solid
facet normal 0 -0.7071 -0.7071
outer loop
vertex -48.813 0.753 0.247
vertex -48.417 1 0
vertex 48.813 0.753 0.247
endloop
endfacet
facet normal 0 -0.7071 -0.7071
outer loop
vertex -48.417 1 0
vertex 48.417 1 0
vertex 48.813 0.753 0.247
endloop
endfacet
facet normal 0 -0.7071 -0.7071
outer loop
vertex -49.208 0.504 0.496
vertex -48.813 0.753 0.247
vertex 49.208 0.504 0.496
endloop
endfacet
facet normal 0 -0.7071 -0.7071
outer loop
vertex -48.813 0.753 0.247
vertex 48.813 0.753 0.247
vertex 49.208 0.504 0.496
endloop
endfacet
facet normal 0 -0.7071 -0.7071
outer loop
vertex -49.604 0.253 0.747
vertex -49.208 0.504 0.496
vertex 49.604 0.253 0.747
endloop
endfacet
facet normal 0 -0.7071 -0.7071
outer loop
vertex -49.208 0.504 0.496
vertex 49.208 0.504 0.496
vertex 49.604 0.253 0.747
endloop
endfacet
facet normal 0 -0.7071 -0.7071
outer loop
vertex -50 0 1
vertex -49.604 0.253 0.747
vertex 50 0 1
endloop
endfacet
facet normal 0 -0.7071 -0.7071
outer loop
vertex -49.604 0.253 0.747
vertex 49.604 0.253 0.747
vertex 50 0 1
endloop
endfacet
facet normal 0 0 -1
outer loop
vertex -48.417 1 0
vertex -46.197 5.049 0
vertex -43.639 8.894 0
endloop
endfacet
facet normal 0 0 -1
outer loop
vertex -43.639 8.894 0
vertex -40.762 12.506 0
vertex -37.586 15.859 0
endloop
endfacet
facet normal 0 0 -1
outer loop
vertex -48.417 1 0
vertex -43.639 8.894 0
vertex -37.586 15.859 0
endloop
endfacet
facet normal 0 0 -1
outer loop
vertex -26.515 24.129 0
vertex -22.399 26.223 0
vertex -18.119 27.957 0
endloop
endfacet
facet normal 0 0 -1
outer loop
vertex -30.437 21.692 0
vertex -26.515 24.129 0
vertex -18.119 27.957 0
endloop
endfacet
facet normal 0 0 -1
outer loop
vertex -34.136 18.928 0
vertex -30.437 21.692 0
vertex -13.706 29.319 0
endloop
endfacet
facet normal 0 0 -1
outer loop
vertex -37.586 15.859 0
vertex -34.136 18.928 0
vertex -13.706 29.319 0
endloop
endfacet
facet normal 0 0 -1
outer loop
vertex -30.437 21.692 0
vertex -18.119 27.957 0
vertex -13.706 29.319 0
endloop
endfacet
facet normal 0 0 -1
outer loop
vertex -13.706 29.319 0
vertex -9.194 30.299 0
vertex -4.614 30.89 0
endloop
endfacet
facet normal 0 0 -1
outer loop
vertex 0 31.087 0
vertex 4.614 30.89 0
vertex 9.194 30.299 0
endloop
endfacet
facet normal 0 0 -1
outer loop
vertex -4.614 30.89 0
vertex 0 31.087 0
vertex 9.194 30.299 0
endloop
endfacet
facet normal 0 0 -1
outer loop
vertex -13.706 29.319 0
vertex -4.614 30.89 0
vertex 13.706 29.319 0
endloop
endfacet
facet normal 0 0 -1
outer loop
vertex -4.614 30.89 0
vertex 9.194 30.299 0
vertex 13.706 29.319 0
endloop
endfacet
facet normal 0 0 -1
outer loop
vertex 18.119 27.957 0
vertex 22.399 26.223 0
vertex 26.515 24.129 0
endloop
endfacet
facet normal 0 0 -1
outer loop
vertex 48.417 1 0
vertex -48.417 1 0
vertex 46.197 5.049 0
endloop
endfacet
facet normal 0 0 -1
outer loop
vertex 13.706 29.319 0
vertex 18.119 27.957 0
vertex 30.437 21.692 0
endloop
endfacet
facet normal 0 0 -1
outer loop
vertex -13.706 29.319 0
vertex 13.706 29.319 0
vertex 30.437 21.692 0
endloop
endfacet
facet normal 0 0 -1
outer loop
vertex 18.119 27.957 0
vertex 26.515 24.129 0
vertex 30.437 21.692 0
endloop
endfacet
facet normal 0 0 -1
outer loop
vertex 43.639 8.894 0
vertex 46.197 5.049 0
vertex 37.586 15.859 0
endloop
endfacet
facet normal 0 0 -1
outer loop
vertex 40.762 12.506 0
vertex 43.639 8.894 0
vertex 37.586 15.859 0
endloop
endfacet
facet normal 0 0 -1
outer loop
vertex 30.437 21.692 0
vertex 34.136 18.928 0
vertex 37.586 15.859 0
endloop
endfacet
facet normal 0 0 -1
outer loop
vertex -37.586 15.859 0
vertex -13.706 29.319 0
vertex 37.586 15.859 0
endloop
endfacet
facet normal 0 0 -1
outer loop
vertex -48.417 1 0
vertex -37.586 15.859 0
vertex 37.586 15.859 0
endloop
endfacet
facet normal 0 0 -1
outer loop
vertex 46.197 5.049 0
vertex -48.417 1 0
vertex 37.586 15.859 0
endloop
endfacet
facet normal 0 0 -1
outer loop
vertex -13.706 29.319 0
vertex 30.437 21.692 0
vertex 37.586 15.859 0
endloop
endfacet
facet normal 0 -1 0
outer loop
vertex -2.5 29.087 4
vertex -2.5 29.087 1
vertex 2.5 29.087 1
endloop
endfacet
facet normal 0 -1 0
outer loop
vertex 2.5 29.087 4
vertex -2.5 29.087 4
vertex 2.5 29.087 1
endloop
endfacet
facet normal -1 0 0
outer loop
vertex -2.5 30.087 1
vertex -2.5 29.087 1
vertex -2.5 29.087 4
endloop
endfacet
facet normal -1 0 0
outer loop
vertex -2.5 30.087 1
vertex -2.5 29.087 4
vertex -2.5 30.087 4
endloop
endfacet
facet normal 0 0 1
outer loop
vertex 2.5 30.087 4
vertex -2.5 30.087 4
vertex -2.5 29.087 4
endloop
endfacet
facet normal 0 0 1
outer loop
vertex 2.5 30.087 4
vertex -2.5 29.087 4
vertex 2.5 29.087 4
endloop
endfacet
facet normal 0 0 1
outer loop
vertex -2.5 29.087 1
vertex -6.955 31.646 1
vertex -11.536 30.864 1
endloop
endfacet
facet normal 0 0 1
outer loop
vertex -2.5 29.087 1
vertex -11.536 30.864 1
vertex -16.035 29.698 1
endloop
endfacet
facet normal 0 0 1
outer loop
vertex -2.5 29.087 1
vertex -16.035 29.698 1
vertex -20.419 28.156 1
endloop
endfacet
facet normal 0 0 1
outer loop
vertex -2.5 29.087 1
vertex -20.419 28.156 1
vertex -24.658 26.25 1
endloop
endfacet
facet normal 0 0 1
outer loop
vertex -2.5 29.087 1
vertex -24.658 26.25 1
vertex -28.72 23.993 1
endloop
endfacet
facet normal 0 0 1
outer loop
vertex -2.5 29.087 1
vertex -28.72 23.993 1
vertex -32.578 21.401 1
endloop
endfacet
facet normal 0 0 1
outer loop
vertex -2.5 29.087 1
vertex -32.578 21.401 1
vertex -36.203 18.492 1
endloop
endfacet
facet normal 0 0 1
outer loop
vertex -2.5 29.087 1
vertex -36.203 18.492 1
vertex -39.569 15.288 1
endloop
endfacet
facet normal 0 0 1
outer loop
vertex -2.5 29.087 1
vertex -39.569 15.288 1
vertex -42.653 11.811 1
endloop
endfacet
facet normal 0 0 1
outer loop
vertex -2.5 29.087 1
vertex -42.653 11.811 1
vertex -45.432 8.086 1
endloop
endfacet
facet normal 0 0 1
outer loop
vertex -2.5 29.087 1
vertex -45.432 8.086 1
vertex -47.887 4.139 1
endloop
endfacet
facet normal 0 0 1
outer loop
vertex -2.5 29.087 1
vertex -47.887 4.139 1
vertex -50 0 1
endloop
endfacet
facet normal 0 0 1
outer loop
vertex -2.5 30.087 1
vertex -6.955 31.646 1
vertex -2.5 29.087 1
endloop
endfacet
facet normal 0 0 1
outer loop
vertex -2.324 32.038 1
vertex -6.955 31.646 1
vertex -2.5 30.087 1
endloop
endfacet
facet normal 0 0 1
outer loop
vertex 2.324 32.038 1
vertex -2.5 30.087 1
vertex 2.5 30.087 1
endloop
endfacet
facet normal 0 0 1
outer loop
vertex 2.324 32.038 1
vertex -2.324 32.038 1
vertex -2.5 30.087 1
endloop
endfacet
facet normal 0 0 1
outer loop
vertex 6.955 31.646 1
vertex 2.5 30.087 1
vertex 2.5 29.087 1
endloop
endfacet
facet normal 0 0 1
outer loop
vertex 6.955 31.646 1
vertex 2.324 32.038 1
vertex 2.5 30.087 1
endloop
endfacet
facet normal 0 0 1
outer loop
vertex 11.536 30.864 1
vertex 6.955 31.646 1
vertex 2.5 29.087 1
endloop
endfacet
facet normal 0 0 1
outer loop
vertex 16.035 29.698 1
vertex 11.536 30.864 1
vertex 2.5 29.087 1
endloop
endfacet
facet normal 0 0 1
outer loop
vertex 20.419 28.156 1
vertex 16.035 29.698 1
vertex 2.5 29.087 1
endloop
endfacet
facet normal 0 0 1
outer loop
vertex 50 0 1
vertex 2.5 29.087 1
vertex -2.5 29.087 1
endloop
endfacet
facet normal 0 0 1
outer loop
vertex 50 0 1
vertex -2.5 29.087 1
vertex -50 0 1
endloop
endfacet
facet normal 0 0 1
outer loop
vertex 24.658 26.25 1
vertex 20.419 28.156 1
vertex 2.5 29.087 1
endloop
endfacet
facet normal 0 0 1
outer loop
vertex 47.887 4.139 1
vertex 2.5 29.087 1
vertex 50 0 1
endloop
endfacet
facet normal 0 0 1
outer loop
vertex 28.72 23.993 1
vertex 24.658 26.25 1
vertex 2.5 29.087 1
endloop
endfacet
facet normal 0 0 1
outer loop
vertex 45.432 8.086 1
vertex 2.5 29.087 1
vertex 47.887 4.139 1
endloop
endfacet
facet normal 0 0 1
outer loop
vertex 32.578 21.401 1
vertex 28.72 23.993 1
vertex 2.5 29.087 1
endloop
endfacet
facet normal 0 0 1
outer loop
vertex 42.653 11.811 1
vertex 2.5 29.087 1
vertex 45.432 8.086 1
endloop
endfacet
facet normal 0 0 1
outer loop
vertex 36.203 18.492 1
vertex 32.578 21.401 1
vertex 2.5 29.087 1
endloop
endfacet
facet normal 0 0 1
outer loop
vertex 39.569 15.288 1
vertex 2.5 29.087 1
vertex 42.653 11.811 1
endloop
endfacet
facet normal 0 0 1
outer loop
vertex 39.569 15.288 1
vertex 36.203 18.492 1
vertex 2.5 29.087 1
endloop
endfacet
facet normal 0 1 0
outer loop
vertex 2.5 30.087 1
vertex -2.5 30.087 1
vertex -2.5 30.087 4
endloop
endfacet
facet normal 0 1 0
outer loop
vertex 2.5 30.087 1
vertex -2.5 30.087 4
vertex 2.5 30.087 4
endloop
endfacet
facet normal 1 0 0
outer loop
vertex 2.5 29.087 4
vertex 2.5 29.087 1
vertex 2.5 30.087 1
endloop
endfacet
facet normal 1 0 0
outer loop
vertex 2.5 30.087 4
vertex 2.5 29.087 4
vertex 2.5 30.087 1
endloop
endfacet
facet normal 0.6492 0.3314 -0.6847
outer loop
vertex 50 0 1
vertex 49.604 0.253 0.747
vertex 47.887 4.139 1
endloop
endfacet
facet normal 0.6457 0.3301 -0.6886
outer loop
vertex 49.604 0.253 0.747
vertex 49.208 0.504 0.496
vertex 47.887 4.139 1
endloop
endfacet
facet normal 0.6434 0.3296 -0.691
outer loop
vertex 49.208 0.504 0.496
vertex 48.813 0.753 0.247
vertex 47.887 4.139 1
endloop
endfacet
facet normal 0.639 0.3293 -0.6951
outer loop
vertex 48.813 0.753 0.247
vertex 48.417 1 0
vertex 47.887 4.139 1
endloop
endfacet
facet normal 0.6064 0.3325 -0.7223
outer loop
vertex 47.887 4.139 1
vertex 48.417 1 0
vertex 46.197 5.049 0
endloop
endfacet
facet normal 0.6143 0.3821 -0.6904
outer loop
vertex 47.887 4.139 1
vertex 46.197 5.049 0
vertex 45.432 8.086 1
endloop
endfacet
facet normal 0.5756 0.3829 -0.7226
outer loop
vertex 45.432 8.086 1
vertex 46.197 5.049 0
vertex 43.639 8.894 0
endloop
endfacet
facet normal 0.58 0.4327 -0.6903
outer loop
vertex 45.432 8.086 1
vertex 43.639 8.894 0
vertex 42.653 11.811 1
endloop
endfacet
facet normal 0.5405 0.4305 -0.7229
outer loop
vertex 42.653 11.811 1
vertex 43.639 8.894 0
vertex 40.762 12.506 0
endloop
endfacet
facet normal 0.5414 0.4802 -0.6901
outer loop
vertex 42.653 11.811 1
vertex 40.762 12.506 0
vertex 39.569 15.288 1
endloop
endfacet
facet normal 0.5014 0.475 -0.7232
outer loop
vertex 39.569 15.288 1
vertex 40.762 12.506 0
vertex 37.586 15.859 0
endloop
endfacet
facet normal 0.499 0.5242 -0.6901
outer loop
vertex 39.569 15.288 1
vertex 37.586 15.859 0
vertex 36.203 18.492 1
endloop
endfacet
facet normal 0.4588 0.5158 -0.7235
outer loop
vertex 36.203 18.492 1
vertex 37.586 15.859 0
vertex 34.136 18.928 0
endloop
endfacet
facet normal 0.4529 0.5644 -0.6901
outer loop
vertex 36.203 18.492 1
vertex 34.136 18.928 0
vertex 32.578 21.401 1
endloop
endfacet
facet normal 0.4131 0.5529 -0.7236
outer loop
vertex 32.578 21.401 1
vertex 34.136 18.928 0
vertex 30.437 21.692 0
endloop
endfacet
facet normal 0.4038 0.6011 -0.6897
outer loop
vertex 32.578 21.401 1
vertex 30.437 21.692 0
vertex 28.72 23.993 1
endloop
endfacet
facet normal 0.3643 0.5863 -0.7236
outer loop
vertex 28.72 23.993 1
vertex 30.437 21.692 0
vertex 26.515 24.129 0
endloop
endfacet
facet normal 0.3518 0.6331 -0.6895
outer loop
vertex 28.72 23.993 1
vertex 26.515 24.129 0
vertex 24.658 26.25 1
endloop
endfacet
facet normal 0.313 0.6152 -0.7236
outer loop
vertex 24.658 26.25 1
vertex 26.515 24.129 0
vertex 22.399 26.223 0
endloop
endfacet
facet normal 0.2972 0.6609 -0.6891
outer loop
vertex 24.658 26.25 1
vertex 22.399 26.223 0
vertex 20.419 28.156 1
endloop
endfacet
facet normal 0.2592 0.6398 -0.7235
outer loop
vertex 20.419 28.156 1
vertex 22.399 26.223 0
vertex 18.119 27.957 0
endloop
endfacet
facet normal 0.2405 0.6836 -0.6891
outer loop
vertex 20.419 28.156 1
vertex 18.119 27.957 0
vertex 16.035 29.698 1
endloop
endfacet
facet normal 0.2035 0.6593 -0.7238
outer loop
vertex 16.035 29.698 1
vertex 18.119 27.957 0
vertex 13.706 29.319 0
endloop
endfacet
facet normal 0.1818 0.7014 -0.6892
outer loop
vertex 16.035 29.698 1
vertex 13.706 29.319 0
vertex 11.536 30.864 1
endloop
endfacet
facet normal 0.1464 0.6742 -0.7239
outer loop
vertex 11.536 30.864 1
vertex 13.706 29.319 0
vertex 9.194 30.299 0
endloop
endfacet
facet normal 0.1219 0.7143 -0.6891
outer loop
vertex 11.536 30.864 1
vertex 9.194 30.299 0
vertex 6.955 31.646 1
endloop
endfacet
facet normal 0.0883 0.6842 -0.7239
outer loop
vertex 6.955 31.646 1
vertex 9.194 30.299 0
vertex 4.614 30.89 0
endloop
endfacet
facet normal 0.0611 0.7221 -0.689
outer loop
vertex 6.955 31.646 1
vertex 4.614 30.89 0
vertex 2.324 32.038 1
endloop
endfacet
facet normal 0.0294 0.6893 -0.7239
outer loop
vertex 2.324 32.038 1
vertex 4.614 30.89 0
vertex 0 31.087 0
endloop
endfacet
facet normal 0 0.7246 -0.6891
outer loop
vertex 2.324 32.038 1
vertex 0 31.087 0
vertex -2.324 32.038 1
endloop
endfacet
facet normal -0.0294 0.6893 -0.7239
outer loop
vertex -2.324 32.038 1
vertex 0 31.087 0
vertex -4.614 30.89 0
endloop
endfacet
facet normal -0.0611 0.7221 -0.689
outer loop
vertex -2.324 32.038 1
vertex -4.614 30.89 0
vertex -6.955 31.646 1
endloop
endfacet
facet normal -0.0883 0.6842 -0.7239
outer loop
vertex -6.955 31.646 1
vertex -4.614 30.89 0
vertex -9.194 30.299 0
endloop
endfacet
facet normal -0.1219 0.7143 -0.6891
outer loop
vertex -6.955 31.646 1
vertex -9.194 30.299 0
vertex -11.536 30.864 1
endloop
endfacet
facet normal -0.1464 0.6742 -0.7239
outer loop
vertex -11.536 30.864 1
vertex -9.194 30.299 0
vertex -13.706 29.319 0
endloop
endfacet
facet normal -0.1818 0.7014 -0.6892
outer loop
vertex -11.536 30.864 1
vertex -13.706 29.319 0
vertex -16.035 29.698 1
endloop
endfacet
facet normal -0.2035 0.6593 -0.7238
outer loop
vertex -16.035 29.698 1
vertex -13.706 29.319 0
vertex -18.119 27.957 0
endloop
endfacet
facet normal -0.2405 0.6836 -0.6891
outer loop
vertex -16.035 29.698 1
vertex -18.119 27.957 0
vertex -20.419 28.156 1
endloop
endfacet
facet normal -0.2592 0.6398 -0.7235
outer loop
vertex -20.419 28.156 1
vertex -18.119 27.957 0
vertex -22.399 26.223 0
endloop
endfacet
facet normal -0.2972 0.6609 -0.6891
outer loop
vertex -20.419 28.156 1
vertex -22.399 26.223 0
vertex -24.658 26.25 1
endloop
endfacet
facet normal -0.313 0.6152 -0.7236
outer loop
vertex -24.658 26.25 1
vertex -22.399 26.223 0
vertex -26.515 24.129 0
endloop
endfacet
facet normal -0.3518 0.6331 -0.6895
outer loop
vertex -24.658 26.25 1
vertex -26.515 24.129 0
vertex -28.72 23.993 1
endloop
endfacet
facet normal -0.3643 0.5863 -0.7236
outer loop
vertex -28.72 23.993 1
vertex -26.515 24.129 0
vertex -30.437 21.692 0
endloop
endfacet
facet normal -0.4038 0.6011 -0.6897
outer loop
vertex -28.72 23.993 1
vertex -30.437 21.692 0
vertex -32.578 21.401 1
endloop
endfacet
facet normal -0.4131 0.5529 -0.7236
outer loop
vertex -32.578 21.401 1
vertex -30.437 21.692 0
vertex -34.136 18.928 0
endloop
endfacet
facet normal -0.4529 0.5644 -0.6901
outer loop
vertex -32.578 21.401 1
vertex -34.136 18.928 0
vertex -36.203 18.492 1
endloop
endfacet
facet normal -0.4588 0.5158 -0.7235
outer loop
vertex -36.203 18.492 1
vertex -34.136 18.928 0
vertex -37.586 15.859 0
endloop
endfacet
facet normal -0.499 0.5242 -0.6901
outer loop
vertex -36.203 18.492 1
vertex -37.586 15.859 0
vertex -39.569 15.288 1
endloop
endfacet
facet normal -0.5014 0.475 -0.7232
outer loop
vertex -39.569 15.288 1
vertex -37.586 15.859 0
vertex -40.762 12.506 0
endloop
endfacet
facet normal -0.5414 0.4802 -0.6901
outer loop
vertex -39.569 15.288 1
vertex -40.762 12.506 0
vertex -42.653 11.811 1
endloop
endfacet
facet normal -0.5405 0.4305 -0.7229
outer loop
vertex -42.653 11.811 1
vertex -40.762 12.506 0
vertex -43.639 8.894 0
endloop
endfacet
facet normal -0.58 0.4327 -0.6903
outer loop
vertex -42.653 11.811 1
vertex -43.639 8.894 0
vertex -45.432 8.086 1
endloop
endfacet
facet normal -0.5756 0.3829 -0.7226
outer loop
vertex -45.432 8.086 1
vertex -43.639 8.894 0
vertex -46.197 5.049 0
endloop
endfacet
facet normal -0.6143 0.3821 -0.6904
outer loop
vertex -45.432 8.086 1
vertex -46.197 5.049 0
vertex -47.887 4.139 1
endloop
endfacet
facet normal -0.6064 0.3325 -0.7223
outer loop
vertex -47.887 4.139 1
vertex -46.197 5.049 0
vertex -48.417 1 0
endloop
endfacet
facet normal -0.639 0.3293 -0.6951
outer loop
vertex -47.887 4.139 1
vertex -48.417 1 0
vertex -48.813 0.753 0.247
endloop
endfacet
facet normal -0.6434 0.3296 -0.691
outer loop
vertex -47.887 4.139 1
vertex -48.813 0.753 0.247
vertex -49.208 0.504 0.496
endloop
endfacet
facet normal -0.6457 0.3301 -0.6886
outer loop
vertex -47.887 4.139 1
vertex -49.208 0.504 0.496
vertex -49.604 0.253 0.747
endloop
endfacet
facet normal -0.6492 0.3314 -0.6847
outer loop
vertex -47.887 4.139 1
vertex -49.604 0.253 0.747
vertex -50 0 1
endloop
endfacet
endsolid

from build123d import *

# Parameters (mm, degrees)
F0_W     = 5
F0_H     = 1
F1_DEPTH = 4
F2_DEPTH = 1
F3_SIZE  = 0.99999


# Not quite as in the source:
# - a fillet or chamfer is up to 0.001 mm smaller than in the source, because OpenCascade refuses the exact size


with BuildPart() as f1:
    # F0 (on Top) → F1 (new body)
    with BuildSketch(Plane.XY):
        with Locations((0, 29.5871215252)):
            Rectangle(F0_W, F0_H)
    extrude(amount=F1_DEPTH)

    # F0 (on Top) → F2 (join)
    with BuildSketch(Plane.XY):
        with BuildLine():
            Line((-50, 0), (50, 0))
            ThreePointArc((50, 0), (0, 32.0871215252), (-50, 0))
        make_face()
        with Locations((0, 29.5871215252)):
            Rectangle(F0_W, F0_H, mode=Mode.SUBTRACT)
    extrude(amount=F2_DEPTH)

    # F3 (size 1 in the source; OpenCascade refuses exactly that, so slightly less here)
    f3_edges = [f1.edges().sort_by_distance(p)[0] for p in [
        (0, 32.087122, 0),
        (0, 0, 0),
    ]]
    chamfer(f3_edges, length=F3_SIZE)


solid = f1.part
